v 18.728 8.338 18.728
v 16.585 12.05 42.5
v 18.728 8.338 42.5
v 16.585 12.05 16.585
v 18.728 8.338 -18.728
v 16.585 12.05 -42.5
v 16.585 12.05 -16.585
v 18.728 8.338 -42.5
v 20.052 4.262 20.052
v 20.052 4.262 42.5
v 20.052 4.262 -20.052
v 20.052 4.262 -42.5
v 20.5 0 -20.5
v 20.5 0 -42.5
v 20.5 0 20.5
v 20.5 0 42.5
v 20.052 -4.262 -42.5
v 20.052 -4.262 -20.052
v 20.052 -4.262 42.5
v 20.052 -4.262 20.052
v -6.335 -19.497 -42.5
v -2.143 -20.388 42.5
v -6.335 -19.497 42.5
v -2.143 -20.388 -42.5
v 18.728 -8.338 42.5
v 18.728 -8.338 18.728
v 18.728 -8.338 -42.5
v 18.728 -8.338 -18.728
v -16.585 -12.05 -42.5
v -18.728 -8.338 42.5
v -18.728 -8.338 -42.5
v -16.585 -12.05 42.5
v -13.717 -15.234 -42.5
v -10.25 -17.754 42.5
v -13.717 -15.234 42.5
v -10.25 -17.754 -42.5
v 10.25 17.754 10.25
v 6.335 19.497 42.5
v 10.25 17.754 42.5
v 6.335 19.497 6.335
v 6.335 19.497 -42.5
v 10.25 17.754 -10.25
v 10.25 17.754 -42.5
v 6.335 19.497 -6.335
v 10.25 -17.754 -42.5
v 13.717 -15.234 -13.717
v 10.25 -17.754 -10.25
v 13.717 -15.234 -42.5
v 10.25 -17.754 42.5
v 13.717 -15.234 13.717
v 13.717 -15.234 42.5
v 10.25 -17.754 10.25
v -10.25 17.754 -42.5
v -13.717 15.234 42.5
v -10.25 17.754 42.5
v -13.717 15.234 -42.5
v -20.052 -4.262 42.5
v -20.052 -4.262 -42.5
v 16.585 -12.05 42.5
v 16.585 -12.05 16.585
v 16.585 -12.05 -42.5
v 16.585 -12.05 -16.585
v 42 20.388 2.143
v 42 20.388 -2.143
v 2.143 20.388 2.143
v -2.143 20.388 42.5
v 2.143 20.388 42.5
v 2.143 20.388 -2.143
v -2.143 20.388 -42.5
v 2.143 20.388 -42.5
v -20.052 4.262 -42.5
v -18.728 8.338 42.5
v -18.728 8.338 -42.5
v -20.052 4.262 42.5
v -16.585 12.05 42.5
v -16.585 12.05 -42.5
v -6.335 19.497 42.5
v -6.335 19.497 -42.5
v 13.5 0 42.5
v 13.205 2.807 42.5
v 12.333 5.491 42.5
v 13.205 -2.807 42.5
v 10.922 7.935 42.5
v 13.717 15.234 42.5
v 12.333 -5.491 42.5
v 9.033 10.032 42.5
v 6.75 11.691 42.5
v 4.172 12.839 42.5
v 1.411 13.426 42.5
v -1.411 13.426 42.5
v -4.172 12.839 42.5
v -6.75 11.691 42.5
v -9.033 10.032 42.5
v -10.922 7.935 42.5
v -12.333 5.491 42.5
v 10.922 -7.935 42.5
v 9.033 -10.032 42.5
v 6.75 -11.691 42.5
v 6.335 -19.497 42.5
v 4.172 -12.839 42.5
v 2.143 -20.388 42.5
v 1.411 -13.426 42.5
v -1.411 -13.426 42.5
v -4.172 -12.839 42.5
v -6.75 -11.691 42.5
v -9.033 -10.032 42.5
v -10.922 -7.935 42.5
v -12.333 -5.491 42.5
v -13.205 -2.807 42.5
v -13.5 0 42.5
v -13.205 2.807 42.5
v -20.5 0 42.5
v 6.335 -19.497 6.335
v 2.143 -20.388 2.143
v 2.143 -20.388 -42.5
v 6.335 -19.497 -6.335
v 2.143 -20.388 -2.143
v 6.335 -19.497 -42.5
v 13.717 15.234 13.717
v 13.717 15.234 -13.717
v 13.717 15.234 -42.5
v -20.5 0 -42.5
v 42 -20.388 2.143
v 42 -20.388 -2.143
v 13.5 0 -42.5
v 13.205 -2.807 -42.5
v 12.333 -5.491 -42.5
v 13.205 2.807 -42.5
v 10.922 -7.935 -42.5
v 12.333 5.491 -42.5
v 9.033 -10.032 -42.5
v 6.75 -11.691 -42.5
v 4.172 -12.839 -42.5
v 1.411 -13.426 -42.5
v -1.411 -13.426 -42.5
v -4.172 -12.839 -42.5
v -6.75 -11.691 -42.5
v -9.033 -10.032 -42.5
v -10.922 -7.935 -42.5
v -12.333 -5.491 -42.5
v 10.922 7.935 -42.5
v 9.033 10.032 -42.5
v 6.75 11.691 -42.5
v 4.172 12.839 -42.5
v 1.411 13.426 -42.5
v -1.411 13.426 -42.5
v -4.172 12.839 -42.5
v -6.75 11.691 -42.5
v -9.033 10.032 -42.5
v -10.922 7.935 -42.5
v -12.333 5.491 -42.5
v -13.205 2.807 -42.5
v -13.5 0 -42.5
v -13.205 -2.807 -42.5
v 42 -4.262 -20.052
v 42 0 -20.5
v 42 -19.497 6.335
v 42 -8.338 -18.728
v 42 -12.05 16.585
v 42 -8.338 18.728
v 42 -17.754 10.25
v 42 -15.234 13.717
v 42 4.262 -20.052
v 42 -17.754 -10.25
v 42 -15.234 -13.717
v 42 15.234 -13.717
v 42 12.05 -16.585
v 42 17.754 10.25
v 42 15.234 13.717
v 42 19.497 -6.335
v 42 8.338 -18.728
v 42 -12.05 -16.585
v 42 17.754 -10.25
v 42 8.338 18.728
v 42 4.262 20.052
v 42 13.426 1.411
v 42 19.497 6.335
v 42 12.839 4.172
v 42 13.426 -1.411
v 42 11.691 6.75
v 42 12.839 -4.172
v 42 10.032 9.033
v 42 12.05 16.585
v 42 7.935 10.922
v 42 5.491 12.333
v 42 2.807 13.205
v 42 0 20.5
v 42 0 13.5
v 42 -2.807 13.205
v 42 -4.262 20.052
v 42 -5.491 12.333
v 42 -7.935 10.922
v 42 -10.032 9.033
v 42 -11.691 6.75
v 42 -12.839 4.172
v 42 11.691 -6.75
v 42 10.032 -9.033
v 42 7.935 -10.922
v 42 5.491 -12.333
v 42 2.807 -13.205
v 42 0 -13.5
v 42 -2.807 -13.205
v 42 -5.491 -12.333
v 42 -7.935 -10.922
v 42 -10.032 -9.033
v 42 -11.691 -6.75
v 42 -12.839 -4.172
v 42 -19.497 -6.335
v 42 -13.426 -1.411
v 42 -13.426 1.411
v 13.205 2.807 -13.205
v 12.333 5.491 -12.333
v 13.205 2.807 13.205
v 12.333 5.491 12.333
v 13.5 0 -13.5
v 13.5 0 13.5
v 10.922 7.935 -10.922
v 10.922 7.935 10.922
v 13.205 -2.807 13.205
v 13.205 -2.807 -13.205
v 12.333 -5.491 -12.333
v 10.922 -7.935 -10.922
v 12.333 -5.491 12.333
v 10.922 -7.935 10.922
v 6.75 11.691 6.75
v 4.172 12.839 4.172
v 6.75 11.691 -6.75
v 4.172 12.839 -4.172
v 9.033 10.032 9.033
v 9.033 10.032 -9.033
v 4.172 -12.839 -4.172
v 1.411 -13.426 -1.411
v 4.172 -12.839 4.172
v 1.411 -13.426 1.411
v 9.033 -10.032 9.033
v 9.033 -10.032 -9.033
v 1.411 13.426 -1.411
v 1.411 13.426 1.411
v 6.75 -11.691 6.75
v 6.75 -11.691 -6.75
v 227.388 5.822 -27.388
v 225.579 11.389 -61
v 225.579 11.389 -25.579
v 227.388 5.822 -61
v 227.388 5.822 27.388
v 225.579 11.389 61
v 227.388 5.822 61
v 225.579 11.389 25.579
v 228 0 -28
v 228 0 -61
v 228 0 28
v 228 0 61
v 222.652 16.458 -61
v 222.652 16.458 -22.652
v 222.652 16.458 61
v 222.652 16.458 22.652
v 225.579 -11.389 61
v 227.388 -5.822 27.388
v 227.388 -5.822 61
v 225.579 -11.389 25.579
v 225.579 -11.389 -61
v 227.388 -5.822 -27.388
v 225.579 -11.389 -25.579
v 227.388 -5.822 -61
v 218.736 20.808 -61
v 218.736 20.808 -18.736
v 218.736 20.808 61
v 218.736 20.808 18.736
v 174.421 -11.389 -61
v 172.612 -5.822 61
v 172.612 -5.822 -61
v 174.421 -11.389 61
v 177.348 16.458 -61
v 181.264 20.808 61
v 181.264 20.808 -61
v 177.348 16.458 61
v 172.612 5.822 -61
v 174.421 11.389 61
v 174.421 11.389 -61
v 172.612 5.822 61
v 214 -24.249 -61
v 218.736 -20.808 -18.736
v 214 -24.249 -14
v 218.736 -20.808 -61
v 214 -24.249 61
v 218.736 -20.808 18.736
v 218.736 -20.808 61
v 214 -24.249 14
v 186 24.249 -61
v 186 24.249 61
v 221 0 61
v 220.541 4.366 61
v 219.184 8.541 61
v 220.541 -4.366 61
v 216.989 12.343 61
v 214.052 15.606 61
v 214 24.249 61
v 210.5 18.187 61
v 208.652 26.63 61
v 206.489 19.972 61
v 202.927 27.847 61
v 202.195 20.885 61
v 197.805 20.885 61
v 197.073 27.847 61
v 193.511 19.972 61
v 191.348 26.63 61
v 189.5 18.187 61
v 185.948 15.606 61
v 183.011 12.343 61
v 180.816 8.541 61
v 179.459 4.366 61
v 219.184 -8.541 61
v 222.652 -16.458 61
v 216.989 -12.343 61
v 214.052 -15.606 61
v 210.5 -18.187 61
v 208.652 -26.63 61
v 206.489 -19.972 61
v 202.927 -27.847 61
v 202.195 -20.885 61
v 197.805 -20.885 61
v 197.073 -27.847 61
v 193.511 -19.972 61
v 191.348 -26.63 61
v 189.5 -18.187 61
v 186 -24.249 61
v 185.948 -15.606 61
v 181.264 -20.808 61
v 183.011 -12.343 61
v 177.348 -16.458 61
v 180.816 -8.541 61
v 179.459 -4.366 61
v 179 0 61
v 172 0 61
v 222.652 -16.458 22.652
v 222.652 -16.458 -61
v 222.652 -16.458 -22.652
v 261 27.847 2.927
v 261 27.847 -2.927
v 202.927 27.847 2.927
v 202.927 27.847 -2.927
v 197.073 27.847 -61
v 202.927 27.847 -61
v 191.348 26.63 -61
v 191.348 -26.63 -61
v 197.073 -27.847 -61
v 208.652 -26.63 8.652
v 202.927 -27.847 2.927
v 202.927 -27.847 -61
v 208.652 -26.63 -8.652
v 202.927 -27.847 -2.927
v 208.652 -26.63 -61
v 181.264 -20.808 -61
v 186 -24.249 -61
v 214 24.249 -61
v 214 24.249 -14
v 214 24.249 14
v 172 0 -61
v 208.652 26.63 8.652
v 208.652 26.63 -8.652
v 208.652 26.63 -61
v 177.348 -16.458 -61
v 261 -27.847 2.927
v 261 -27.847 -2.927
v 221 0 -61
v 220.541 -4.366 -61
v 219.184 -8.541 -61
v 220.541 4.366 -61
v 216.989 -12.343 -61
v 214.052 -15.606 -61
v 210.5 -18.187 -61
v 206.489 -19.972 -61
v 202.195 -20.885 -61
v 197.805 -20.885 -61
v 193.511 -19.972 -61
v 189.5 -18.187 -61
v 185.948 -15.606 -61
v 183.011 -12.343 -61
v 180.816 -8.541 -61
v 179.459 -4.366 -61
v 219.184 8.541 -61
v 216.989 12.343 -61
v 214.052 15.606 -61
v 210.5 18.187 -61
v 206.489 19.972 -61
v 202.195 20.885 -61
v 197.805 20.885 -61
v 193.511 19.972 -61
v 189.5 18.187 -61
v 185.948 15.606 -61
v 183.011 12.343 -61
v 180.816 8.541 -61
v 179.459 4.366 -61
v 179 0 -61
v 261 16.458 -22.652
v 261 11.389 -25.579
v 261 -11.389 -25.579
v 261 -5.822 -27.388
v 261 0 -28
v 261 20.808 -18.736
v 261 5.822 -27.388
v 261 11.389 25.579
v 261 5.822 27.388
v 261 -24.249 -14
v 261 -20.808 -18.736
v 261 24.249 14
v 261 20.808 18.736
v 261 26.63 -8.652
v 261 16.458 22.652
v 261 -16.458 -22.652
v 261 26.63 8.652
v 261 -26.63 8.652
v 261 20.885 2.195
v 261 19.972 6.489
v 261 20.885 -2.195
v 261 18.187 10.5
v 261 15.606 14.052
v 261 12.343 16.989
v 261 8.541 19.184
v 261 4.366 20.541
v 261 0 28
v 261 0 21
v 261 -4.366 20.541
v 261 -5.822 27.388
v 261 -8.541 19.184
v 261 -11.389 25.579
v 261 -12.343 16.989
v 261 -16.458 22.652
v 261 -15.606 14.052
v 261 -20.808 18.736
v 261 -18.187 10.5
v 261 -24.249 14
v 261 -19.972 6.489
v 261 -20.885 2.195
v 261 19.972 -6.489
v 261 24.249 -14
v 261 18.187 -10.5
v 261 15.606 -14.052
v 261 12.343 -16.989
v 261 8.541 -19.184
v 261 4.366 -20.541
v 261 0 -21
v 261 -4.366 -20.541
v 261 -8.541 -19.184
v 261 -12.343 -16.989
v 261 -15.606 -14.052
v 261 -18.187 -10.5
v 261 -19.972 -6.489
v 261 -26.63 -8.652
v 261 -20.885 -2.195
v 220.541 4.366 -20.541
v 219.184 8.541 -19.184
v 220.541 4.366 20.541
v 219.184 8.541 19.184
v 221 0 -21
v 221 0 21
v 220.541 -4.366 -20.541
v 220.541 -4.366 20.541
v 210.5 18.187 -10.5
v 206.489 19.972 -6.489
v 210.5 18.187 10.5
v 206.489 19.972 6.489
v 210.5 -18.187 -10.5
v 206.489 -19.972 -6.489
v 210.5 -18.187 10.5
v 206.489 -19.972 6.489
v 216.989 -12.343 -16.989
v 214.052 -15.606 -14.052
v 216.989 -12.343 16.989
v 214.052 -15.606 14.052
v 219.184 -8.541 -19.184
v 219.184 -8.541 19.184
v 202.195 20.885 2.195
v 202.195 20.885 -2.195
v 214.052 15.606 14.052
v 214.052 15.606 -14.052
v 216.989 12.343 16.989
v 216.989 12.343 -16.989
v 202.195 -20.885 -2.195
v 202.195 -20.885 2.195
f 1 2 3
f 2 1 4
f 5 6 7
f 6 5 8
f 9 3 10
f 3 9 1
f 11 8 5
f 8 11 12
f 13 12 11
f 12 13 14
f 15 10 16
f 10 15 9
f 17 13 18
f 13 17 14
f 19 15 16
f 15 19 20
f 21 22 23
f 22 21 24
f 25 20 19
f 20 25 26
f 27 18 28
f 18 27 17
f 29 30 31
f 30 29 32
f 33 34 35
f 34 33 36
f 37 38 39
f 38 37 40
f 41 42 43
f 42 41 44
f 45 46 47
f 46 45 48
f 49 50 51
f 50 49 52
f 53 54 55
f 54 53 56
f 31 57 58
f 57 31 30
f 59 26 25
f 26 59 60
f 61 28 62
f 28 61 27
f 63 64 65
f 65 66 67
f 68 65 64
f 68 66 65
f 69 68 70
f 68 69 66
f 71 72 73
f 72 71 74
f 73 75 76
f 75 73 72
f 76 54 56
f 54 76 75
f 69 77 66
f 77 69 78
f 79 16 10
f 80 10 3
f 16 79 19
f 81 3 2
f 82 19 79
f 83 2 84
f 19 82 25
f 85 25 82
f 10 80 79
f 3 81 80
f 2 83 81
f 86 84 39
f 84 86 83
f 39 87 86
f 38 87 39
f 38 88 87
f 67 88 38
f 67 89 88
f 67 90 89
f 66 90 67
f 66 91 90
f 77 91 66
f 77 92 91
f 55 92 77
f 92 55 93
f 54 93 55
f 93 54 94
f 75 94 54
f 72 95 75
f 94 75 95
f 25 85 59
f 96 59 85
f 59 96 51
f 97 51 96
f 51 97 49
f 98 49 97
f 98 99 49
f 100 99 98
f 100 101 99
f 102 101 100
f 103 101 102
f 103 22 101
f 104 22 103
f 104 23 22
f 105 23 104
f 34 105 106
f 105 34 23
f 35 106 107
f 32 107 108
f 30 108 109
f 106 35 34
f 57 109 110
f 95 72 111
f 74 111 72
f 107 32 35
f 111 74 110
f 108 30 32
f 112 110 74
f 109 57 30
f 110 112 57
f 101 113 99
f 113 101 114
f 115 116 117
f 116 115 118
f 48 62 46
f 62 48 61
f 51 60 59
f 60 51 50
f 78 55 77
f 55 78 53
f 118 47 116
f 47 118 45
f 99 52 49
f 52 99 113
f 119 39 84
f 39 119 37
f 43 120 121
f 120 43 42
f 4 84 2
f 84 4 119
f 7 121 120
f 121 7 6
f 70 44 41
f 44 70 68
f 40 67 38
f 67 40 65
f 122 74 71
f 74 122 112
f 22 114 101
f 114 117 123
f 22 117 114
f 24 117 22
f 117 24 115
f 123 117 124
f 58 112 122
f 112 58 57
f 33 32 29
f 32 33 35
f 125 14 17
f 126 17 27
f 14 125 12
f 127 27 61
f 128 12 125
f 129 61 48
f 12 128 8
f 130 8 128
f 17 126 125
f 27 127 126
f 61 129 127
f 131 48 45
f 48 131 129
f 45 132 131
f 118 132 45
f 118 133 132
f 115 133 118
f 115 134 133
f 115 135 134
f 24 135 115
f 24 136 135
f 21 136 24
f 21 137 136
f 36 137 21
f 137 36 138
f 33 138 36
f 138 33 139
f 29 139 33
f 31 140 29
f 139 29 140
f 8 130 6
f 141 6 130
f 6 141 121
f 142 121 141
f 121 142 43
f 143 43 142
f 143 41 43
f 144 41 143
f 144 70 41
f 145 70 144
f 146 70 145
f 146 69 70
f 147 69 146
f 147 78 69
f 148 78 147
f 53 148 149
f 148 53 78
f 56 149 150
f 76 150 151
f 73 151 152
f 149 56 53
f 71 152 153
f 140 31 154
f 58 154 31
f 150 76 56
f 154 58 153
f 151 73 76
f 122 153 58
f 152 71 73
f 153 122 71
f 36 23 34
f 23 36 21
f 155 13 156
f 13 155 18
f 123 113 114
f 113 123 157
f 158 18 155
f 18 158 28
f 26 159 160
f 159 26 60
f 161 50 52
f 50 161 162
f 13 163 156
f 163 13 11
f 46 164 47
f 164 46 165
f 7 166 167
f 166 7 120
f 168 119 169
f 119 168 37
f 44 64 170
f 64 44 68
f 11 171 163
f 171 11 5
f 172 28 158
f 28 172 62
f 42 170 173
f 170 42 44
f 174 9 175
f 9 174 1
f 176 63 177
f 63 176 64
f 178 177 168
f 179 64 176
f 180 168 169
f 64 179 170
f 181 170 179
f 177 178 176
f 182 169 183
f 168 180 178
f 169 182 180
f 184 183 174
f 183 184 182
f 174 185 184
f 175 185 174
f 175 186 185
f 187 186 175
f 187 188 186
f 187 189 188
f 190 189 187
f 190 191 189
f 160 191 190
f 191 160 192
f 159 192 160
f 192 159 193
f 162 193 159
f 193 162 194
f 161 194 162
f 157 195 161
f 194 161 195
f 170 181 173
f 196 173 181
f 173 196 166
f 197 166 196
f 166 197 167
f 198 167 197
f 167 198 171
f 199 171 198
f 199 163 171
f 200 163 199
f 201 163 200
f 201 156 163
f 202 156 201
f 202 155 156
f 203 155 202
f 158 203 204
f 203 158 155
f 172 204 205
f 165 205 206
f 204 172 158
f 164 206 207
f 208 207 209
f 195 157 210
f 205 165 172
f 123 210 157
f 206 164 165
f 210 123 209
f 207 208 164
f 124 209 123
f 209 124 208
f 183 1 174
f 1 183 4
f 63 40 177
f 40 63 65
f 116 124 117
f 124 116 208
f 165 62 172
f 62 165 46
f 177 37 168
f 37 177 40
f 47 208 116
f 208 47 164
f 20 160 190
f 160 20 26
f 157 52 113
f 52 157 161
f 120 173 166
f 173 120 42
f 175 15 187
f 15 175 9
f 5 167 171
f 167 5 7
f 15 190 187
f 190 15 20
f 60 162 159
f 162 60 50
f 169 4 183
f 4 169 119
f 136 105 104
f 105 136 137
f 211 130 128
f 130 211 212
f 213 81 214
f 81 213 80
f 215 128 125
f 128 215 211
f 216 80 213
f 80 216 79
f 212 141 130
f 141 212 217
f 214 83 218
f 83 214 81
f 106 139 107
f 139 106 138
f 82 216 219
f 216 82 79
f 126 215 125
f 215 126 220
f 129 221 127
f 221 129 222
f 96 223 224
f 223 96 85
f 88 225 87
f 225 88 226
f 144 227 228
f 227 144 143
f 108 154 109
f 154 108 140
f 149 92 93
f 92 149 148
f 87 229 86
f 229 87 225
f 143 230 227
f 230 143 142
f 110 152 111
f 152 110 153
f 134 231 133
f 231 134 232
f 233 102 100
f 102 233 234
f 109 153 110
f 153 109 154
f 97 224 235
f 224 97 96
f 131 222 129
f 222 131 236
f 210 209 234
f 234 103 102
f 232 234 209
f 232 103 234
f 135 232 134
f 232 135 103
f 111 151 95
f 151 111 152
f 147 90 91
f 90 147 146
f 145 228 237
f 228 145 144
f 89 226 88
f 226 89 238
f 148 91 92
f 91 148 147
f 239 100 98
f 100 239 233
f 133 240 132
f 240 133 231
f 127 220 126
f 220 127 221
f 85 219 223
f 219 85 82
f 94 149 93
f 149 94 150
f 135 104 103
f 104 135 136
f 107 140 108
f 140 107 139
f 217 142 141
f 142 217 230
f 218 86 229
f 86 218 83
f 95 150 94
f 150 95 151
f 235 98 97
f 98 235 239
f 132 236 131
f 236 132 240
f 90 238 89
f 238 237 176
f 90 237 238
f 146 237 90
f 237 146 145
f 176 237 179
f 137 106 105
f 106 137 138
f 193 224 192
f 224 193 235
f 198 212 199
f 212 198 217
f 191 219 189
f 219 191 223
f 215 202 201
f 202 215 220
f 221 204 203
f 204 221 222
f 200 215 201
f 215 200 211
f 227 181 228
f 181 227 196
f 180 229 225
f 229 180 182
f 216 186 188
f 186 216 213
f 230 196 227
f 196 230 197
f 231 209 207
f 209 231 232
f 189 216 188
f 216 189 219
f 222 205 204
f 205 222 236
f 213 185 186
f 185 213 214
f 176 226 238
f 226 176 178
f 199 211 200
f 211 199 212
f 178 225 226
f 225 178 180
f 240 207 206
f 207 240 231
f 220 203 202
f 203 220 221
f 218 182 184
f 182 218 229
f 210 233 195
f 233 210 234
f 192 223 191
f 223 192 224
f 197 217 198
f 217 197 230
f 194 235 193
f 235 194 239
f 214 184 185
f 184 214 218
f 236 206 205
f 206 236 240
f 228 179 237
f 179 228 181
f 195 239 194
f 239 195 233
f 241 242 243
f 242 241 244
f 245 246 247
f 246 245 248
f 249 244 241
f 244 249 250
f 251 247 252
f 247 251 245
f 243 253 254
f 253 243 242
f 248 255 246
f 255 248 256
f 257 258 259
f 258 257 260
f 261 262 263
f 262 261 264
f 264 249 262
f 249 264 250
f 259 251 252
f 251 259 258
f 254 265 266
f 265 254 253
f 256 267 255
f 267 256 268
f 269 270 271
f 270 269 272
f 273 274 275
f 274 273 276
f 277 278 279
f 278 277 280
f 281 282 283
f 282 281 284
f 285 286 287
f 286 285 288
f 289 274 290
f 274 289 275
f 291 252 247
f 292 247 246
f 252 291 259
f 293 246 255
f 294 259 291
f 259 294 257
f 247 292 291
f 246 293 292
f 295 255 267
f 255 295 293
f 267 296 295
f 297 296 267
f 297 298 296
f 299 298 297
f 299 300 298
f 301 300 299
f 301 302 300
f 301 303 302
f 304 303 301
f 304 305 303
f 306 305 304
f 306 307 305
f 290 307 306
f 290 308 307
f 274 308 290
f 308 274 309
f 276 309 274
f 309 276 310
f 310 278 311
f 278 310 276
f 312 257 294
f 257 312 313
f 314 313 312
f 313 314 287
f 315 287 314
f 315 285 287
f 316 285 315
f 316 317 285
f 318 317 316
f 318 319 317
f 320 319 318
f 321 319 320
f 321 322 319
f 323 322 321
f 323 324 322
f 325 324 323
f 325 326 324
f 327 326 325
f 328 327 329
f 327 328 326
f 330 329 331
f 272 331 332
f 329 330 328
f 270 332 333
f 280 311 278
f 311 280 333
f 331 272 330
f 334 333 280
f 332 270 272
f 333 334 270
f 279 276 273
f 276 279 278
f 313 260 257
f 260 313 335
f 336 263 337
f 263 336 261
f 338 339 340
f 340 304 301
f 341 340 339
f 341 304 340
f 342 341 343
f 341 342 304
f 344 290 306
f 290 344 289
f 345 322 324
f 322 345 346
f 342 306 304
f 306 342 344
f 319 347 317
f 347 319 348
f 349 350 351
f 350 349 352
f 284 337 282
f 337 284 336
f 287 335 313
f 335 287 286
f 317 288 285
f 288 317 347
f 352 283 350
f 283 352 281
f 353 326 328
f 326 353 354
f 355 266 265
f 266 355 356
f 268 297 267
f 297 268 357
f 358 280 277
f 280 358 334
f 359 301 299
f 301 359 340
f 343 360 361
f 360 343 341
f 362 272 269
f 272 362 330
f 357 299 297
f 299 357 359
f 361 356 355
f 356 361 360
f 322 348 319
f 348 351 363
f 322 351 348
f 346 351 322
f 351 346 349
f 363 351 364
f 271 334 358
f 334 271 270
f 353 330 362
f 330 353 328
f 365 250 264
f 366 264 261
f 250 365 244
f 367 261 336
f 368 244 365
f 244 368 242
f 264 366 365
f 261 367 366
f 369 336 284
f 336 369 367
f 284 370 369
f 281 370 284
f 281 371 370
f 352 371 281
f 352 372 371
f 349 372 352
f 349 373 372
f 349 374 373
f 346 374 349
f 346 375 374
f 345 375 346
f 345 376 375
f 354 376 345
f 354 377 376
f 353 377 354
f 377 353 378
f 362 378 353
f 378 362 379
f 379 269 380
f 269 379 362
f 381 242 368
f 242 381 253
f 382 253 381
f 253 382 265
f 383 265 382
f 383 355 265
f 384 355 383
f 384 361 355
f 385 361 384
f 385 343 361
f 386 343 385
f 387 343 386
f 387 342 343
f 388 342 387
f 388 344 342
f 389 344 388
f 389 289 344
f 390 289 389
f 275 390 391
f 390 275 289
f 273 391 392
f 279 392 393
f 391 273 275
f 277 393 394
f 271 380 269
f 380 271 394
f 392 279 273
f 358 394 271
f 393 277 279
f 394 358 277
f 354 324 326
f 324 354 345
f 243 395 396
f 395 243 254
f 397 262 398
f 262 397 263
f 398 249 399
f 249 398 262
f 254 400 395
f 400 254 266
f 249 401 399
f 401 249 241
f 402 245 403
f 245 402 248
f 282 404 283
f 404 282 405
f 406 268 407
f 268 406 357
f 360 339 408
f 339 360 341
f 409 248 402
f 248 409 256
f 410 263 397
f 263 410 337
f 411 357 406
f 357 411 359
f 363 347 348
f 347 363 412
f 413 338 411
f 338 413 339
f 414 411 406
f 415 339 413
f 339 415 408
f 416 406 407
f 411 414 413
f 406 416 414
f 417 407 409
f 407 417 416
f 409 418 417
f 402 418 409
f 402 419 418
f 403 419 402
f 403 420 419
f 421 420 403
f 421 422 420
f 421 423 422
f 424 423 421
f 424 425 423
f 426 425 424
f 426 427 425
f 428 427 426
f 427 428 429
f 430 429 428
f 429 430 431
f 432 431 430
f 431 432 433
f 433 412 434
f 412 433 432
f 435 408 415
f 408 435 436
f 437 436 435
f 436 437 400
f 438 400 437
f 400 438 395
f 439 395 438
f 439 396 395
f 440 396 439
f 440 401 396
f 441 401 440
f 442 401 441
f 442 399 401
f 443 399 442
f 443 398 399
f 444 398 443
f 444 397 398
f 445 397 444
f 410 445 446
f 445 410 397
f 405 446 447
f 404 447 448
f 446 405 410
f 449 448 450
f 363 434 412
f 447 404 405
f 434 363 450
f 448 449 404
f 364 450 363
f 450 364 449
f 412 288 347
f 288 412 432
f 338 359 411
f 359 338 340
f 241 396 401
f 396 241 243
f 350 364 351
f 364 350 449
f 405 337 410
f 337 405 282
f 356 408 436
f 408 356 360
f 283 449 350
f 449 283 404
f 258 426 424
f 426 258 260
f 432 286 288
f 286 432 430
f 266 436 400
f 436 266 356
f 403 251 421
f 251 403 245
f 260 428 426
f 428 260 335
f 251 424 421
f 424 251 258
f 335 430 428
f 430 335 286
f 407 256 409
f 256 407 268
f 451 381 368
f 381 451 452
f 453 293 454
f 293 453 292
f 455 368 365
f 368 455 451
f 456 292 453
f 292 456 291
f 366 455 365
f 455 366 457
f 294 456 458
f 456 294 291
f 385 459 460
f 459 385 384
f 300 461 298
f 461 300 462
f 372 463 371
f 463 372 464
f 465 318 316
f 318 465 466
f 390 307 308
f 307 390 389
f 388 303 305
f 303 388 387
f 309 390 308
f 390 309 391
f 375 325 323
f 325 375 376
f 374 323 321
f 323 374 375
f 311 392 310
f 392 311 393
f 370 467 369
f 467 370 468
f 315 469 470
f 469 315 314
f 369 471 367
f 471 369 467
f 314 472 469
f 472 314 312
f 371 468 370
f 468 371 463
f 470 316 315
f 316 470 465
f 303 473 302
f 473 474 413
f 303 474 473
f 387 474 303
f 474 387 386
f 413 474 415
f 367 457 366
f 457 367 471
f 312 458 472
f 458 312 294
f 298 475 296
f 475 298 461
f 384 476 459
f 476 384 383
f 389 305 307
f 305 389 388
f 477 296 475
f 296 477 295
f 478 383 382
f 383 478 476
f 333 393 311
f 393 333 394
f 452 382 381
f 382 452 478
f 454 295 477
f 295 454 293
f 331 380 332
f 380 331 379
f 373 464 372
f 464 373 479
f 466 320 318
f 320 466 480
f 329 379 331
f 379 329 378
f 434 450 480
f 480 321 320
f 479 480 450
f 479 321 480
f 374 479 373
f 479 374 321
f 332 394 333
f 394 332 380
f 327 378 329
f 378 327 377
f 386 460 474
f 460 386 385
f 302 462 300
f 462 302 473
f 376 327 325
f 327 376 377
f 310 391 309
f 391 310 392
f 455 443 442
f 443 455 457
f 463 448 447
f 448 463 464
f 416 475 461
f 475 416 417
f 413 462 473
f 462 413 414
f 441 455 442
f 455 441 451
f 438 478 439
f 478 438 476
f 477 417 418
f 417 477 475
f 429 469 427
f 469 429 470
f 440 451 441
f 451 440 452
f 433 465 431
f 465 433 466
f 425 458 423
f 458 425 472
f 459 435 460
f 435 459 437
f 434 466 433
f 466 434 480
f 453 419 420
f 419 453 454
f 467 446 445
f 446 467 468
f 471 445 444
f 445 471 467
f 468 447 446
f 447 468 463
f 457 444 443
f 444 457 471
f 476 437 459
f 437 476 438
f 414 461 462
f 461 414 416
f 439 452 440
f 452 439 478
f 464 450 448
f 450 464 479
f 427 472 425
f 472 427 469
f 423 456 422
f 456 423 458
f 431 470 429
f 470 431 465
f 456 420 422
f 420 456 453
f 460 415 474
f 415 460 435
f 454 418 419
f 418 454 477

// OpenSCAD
// file: tube_clamp_square_base_plate_132_functions.scad
function get_L_shaft_with_base_plate_square_base_plate_132(beam_width) = 
    // (beam_width == 40) ?
    75
;
function get_R_plate_square_base_plate_132(beam_width) = 
    // (beam_width == 40) ?
    [143, 75, 18.5]
;
function get_thickness_square_base_plate_132(beam_width) = 
    // (beam_width == 40) ?
    8
;
function get_offset_hole_x_square_base_plate_132(beam_width) = 
    // (beam_width == 40) ?
    100 / 2
;
function get_diameter_hole_square_base_plate_132(beam_width) = 
    // (beam_width == 40) ?
    10
;
// file: tube_clamp_round_base_plate_132_functions.scad
function get_L_shaft_with_base_plate_round_base_plate_132(tube_diameter) = 
    (tube_diameter == 27) ? 
        85
    : (tube_diameter == 42) ?
        122
    : 25
;
function get_R_plate_round_base_plate_132(tube_diameter) = 
    (tube_diameter == 27) ? 
        [64, 114, 7]
    : (tube_diameter == 42) ?
        [80, 140, 10]
    : [10, 20, 1]
;
function get_offset_hole_y_round_base_plate_132(tube_diameter) = 
    (tube_diameter == 27) ? 
        38
    : (tube_diameter == 42) ?
        50
    : 10
;
function get_diameter_hole_round_base_plate_132(tube_diameter) = 10;
// file: tube_clamp_round_3_way_through_116_functions.scad
function  get_L_shaft_long_round_3_way_through_116(tube_diameter) = 
    (tube_diameter == 27) ? 
        42
    : (tube_diameter == 42) ?
        60
    : 25
;
function get_thickness_round_3_way_through_116(tube_diameter) = 7;
function get_L_shaft_short_round_3_way_through_116(tube_diameter) = tube_diameter + 2 * get_thickness_round_3_way_through_116();
// file: ../brake/brake_assembly_functions.scad
// include <../../config.scad>; // circular reference!

function get_y_pos_lead_fixing_ballscrew_to_brake_arms(angle_brake_rod, y_pos_axle_rear, x_pos_axle_leg_rear, x_offset_fixing_brake_arm_to_lead_plate) = y_pos_axle_rear - (x_pos_axle_leg_rear - x_offset_fixing_brake_arm_to_lead_plate) / tan(angle_brake_rod); // (X_POS_AXLE_LEG_REAR - X_OFFSET_FIXING_BRAKE_ARM_TO_LEAD_PLATE)
// file: ../common/metric_bolt_functions.scad
function get_metric_bolt_head_height(size) = size;
function get_metric_bolt_head_diameter(size) = size * 2;
function get_metric_bolt_washer_diameter_safe_working_clearance(size) = 
    (size < 20) ?
        4 * size
    :
        3 * size
;
// file: tube_clamp_round_tee_long_104_functions.scad
// include <../../config.scad>;

function get_L_shaft_long_round_tee_long_104(tube_diameter) = 
    (tube_diameter == 27) ? 
        85
    : (tube_diameter == 42) ?
        122
    : 25
;
function get_L_shaft_short_round_tee_long_104(tube_diameter) = 
    (tube_diameter == 27) ? 
        42
    : (tube_diameter == 42) ?
        61
    : 10
;
// main file
include <../../config.scad>;
use <./tube_clamp_round_tee_long_104_functions.scad>;

module tube_clamp_round_tee_long_104(tube_diameter) {
    t = 7;
    L_shaft_long = get_L_shaft_long_round_tee_long_104(tube_diameter);
    L_shaft_short = get_L_shaft_short_round_tee_long_104(tube_diameter);
    color("LightGrey") difference() {
        union() {
            // long edge
            cylinder(L_shaft_long, tube_diameter / 2 + t, tube_diameter / 2 + t, center = true);
            // short perpendicular section
            translate([L_shaft_short / 2, 0, 0]) rotate([0, 90, 0]) cylinder(L_shaft_short, tube_diameter / 2 + t, tube_diameter / 2 + t, center = true);
        }
        cylinder(L_shaft_long, tube_diameter / 2, tube_diameter / 2, center = true);
        translate([L_shaft_short / 2, 0, 0]) rotate([0, 90, 0]) cylinder(L_shaft_short, tube_diameter / 2, tube_diameter / 2, center = true);
    }
    // Shopping
    echo(str("Round tee long 104: Tube clamp Φ", tube_diameter, "mm - x1"));
}

// test output
tube_clamp_round_tee_long_104(27);
translate([200, 0, 0]) tube_clamp_round_tee_long_104(42);
